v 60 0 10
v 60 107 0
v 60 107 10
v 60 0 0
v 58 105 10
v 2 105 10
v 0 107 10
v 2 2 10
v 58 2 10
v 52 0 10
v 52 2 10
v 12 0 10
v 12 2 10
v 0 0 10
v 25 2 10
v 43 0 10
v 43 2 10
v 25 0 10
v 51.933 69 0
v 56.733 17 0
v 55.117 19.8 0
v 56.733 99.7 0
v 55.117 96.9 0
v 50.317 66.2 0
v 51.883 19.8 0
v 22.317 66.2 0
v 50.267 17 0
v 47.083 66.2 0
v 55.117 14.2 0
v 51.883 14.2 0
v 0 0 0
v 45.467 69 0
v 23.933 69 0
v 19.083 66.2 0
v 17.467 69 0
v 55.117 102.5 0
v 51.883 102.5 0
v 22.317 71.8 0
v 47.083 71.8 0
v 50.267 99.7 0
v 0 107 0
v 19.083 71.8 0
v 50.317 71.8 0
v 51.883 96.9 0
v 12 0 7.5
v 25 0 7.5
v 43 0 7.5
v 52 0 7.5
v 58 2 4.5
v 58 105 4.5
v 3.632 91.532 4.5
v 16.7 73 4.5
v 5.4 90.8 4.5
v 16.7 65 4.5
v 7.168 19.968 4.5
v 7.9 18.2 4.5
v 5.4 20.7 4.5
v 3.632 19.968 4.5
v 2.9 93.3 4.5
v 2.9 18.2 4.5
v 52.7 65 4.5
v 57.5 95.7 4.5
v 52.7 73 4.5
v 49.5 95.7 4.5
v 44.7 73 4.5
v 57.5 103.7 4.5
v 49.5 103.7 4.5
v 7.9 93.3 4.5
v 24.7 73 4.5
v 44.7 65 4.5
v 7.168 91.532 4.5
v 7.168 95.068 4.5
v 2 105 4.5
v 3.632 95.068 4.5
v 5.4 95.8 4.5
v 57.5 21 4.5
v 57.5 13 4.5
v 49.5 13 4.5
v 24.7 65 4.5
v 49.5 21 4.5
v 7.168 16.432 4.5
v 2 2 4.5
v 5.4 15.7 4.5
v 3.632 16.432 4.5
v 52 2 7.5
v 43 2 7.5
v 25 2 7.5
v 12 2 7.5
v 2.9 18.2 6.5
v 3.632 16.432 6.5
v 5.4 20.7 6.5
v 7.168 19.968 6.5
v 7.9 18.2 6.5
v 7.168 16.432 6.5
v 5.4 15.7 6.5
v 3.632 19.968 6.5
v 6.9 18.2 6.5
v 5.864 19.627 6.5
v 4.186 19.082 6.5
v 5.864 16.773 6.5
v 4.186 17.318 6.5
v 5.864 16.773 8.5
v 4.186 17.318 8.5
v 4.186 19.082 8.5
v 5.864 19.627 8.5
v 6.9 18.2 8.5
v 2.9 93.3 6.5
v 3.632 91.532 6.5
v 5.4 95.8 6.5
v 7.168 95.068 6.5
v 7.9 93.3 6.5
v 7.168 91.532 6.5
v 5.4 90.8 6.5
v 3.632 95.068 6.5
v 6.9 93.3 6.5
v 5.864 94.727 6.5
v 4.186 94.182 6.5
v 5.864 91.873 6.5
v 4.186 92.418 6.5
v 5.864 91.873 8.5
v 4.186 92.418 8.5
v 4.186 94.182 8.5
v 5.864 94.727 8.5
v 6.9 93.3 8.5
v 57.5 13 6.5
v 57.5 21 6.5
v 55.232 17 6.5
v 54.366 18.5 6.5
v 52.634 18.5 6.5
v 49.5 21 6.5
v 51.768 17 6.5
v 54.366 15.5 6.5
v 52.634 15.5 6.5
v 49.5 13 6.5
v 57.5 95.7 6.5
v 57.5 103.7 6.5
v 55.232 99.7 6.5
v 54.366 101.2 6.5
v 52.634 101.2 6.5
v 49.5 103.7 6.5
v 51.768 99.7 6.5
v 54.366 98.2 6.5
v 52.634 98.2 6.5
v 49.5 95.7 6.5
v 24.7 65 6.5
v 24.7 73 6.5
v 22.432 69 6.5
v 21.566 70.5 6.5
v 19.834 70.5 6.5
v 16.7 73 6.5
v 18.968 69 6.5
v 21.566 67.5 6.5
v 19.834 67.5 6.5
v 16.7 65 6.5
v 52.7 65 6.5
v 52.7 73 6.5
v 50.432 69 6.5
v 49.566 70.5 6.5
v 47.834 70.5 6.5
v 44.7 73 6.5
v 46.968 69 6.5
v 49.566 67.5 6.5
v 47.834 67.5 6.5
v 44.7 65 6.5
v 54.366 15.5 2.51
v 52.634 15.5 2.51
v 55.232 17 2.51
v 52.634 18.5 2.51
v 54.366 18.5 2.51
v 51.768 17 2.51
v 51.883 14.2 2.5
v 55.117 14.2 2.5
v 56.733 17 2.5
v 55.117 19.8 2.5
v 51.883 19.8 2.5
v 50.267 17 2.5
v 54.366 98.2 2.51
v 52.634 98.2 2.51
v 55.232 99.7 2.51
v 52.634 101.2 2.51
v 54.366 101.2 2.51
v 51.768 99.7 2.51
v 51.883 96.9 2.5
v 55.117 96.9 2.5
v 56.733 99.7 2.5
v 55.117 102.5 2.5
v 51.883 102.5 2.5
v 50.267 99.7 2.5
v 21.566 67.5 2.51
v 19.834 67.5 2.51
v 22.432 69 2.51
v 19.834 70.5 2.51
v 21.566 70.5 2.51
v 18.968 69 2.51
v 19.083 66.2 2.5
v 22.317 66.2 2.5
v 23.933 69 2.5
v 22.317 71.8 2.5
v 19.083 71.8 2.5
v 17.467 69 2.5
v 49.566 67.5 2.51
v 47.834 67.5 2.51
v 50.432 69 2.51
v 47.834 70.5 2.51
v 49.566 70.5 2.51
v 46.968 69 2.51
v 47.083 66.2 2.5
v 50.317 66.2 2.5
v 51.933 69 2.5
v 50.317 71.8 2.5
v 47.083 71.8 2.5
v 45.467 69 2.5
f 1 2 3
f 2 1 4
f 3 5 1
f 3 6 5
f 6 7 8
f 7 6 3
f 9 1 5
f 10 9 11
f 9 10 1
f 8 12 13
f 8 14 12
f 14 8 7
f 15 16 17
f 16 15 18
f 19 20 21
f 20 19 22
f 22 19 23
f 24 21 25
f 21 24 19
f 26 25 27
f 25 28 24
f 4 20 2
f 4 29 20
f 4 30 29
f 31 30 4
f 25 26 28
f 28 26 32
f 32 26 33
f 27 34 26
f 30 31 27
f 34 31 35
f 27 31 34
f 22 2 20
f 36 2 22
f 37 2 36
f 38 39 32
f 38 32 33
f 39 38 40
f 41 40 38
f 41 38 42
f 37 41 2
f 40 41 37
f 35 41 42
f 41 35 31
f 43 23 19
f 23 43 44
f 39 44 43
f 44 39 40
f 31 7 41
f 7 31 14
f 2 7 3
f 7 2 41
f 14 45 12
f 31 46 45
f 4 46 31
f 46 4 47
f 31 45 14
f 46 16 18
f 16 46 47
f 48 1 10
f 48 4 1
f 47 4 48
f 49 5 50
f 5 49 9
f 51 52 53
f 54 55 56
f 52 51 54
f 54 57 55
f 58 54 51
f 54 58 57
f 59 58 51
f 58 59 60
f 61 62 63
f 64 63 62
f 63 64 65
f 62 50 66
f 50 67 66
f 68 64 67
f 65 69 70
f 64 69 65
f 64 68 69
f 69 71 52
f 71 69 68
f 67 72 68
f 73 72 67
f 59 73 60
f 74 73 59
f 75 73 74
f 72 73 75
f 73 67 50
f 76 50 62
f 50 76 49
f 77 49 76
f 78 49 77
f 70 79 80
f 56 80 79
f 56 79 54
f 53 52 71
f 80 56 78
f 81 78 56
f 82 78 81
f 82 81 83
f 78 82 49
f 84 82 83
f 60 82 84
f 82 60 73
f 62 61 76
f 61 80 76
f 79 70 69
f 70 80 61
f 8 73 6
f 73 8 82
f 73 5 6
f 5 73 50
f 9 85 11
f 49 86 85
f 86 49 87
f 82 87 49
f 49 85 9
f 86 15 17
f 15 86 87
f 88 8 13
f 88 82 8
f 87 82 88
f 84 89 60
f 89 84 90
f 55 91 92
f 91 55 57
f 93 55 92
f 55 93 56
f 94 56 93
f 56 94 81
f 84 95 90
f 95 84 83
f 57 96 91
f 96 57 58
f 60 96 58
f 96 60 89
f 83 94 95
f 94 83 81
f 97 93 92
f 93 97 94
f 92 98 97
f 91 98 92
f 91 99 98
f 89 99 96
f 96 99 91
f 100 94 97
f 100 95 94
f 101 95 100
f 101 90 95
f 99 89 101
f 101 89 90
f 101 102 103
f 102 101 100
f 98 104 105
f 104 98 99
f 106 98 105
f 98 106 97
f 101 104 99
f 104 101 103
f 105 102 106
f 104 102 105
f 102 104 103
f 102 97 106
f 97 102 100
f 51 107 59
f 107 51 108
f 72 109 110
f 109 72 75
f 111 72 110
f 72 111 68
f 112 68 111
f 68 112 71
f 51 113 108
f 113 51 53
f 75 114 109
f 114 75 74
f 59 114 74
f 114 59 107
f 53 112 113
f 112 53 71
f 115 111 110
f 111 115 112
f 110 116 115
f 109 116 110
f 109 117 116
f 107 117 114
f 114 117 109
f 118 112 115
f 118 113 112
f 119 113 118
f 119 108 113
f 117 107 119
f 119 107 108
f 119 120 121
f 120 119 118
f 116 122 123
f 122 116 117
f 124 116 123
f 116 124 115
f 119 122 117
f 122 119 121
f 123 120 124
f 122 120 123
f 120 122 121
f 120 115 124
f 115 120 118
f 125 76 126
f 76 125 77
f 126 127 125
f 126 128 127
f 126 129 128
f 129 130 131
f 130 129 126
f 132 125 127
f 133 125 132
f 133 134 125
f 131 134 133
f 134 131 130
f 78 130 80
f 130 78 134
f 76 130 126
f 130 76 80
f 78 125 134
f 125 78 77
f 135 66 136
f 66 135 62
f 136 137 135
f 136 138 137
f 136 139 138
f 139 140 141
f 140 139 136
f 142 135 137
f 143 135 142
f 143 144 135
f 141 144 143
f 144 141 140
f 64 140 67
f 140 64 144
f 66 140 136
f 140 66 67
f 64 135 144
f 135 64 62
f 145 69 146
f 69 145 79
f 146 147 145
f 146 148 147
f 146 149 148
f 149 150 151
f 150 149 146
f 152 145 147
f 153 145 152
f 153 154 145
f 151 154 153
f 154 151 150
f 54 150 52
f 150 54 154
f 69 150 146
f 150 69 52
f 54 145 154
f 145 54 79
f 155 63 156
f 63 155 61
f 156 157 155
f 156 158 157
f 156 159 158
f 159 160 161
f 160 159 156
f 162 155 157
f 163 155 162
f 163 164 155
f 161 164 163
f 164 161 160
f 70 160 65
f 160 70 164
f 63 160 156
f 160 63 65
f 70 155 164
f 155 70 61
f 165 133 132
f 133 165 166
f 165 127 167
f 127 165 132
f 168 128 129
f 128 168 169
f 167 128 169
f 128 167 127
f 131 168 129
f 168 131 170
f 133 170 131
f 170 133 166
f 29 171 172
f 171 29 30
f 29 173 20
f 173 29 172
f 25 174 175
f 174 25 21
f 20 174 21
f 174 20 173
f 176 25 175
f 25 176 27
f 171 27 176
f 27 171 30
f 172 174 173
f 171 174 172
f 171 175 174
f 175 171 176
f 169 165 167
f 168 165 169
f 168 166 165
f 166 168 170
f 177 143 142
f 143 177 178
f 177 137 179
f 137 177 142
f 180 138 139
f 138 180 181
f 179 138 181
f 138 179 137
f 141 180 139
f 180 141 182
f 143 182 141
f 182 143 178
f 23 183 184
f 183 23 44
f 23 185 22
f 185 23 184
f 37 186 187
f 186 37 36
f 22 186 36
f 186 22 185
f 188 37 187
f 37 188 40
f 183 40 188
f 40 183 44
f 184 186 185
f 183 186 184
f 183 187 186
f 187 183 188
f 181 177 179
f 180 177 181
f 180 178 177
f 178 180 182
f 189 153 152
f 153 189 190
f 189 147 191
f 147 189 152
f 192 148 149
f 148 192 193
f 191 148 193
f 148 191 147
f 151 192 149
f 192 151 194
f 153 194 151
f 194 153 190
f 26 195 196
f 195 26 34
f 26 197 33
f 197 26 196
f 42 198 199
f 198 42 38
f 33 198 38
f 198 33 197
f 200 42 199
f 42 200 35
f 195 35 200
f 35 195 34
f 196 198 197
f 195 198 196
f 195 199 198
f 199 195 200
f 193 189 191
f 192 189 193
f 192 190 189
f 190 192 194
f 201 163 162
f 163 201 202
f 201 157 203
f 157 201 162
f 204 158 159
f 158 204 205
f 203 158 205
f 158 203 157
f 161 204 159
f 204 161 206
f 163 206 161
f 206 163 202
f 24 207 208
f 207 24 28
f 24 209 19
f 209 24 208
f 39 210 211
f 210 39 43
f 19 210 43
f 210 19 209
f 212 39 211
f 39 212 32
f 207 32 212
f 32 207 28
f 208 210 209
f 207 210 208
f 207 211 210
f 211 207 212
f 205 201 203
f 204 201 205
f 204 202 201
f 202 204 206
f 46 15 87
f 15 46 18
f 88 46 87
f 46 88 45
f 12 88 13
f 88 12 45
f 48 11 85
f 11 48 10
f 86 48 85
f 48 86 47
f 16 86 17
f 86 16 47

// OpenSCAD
// file: Cylinder.scad
// number of faces n a circle (adapted from C code)
function get_fragments_from_r(r) =
    ($fn > 0) ? (($fn >= 3) ? $fn : 3) // at least 3 faces if fn is set
    : ceil(max(min(360 / $fa, 2 * PI * r / $fs), 5));

// Generate cylinder that fits inside a circle or radius r if outcircle is
// false and outside if outcircle is true. This prevents holes from being to
// small.
module Cylinder(r=1, r1=-1, r2=-1, h=1, outcircle=false, center=false) {
    r1_ = (r1 >= 0) ? r1 : r;
    r2_ = (r2 >= 0) ? r2 : r1_;
    n = max(get_fragments_from_r(r1_), get_fragments_from_r(r2_));
    r1__ = outcircle ? r1_ / cos(180 / n) : r1_;
    r2__ = outcircle ? r2_ / cos(180 / n) : r2_;
    cylinder(r1=r1__, r2=r2__, h=h, center=center, $fn=n);
}
// main file
include <Cylinder.scad>

length = 101;
width = 54;
bottom = 4.5;
wall = 2;
height = 10;
overlap=0.123456789;
cage_clearance = 1;

nut_height = 2.5;
nut_size = 5.6;

layer = 0.01;

module Pin() {
    Cylinder(r=5 / 2, h=2);
    Cylinder(r=3 / 2, h=4);
}

module Hole(block=false) {
    if (block) {
        translate([-4, -4, 0])
            cube([8, 8, 2]);
    } else {
        difference() {
            union() {
                translate([0, 0, -1])
                    Cylinder(r=3 / 2, h=height + 2, outcircle=true, $fn=6);
                translate([0, 0, -overlap])
                    Cylinder(r=nut_size / 2, h=nut_height + overlap, outcircle=true, $fn=6);
            }
            translate([-nut_size, -nut_size, nut_height])
                cube([nut_size * 2, nut_size * 2, layer]);
        }
    }
}

pins = [[2.4, 15.2], [2.4, 90.3]];
holes = [[50.5, 14.0],[50.5, 96.7], [17.7, 66.0], [45.7, 66.0]];

difference() {
    union() {
        difference() {
            cube([width + 2 * cage_clearance + 2 * wall, length + 2 * cage_clearance + 2 * wall, height]);
            translate([wall, wall, bottom])
                cube([width + 2 * cage_clearance, length + 2 * cage_clearance, height - bottom + overlap]);
        }
        for (i = [0 : 1]) {
            translate([wall + cage_clearance + pins[i][0], wall + cage_clearance + pins[i][1], bottom])
                Pin();
        }

        for (i = [0 : 3]) {
            translate([wall + cage_clearance + holes[i][0], wall + cage_clearance + holes[i][1], bottom])
                Hole(block=true);
        }
    }
    for (i = [0 : 3]) {
        translate([wall + cage_clearance + holes[i][0], wall + cage_clearance + holes[i][1], 0])
            Hole();
    }
    translate([wall + cage_clearance + 9, -overlap, bottom + 3])
        cube([13, wall + 2 * overlap, 12]);
    translate([wall + cage_clearance + 40, -overlap, bottom + 3])
        cube([9, wall + 2 * overlap, 12]);
}

*difference() {
    union() {
        translate([-10, -10, 0])
            cube([20, 20, bottom]);
        translate([0, 0, bottom])
            Hole(block=true);
        translate([100, 0, 0])
            Pin();
    }
    Hole();
}
